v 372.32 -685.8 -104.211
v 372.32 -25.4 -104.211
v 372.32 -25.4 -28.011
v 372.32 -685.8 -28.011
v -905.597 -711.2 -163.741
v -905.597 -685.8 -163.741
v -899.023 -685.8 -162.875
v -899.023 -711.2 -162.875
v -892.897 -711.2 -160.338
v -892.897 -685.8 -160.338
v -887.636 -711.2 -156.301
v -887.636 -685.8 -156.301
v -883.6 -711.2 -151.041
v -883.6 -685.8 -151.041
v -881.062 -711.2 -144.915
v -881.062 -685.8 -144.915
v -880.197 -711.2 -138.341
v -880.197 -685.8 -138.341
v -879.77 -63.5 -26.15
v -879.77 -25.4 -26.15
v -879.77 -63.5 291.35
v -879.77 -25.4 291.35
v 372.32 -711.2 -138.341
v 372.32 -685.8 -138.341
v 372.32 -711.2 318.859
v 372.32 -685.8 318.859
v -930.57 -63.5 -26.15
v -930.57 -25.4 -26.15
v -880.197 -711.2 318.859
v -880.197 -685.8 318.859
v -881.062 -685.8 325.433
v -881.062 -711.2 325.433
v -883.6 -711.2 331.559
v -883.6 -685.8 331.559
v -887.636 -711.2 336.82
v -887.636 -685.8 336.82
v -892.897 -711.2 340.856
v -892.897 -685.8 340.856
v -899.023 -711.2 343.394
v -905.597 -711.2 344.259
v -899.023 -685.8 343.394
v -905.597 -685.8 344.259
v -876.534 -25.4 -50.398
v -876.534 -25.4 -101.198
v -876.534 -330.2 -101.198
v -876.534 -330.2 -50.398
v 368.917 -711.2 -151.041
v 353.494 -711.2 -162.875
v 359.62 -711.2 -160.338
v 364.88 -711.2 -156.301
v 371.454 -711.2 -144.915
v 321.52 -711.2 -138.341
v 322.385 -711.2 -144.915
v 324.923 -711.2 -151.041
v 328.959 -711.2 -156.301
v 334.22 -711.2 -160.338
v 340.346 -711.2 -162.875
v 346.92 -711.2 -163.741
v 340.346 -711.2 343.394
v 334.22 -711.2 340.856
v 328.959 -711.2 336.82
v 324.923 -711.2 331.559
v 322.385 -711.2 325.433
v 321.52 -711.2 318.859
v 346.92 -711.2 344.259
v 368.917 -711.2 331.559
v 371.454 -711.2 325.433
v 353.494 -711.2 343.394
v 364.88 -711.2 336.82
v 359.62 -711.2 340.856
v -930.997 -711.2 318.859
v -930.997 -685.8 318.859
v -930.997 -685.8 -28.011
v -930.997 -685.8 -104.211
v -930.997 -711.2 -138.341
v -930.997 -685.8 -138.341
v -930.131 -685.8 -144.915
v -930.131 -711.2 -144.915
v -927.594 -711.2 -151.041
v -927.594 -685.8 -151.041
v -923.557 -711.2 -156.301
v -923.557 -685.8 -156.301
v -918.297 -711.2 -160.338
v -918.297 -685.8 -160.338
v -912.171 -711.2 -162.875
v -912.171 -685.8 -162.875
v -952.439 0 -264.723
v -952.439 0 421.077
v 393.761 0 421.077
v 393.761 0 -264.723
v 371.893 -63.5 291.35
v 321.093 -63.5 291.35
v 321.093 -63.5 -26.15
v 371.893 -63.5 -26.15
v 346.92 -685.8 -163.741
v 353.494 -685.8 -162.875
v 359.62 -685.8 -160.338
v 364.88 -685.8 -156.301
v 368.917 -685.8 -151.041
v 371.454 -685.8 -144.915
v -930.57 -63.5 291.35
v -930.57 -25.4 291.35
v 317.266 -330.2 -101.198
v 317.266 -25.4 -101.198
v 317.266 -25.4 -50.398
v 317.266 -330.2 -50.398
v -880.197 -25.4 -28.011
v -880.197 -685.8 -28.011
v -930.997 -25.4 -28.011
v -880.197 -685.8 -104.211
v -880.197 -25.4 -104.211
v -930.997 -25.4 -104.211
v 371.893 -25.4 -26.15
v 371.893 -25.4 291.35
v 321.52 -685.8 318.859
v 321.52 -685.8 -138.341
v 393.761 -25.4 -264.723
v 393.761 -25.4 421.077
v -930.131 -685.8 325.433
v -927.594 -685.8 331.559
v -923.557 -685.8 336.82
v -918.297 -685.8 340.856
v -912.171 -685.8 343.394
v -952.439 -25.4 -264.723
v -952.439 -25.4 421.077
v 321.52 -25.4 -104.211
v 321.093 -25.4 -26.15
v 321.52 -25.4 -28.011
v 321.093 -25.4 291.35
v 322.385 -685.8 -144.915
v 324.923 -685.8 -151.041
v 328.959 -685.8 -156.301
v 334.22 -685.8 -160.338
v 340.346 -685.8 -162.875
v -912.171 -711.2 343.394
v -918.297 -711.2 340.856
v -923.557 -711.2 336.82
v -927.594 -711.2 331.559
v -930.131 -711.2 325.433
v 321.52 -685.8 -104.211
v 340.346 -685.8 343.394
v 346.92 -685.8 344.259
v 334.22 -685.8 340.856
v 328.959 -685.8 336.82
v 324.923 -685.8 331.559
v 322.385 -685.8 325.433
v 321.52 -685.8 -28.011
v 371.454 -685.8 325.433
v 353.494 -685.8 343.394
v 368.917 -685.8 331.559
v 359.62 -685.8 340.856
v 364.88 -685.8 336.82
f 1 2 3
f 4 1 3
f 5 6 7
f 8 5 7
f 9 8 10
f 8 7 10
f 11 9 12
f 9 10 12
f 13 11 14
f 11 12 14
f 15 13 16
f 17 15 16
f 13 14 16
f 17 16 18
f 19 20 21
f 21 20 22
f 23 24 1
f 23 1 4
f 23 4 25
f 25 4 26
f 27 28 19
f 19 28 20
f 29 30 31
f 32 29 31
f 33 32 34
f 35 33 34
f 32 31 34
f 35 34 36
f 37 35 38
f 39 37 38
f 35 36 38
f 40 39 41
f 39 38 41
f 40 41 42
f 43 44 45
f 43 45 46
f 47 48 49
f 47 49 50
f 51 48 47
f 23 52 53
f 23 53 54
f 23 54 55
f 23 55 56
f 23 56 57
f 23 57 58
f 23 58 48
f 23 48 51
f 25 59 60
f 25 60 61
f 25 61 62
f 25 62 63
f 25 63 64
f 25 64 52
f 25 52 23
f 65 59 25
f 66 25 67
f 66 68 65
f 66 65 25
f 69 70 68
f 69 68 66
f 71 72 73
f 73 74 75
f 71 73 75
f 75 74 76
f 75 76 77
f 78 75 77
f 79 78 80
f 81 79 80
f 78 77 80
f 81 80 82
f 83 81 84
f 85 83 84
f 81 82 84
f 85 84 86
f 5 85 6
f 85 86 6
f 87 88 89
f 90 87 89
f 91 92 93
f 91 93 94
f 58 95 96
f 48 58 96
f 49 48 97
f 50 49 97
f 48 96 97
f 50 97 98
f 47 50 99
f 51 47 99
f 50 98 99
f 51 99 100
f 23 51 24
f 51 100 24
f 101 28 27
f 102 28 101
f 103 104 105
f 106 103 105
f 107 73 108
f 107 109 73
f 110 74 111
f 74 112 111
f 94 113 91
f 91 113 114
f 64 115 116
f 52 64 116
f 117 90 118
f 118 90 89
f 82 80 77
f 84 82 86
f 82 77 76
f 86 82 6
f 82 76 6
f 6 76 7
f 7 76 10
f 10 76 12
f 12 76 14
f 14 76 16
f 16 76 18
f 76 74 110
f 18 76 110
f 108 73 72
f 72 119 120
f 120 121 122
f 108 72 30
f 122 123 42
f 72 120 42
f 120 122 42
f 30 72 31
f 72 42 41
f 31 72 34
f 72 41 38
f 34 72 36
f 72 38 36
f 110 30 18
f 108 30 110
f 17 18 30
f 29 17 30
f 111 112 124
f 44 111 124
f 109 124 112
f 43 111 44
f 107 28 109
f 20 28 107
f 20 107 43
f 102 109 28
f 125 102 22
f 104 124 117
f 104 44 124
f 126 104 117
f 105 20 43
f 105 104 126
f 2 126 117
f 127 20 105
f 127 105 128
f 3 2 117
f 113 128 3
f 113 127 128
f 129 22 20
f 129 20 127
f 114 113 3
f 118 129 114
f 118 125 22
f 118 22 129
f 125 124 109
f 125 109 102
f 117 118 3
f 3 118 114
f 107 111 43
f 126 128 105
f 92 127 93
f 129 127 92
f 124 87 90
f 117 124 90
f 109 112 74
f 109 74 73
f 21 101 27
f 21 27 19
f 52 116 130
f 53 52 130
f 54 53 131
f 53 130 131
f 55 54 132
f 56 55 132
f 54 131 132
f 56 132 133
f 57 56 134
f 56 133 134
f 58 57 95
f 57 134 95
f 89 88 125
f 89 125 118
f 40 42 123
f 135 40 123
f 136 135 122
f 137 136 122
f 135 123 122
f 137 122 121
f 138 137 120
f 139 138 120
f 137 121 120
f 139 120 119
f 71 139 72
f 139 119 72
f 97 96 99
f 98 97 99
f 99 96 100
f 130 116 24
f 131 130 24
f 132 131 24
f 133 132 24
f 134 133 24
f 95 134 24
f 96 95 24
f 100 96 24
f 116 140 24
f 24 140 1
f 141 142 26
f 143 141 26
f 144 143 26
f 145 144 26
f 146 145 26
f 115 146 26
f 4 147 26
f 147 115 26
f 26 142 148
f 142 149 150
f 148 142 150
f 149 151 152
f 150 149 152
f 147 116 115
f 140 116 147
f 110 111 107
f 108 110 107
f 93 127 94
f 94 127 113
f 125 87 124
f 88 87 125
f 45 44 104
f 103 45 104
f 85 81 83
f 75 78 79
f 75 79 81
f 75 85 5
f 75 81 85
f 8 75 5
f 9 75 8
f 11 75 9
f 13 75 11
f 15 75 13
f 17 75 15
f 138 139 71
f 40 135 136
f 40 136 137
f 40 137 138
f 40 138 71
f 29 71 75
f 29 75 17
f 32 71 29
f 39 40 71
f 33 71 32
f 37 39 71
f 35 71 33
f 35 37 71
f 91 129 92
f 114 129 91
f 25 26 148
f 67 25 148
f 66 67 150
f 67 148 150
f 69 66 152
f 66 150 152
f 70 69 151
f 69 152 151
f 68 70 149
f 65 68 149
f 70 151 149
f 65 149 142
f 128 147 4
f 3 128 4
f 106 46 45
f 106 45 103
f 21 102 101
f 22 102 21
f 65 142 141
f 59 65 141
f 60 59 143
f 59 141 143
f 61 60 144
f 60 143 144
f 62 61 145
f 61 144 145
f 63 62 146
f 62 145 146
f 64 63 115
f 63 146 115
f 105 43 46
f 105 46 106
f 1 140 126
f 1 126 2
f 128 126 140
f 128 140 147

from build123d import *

# Parameters (mm, degrees)
F0_W     = 1346.2
F0_H     = 685.8
F1_DEPTH = 25.4
F2_W     = 50.8
F2_H     = 317.5
F3_DEPTH = 38.1
F4_W     = 50.8
F4_H     = 76.2
F5_DEPTH = 660.4
F7_DEPTH = 25.4
F8_W     = 1193.8
F8_H     = 50.8
F9_DEPTH = 304.8


with BuildPart() as f1:
    # F0 (on Front) → F1 (new body)
    with BuildSketch(Plane.XZ):
        with Locations((-279.338504, 78.177206)):
            Rectangle(F0_W, F0_H)
    extrude(amount=F1_DEPTH)

    # F2 (on face) → F3 (join)
    with BuildSketch(Plane.XZ.offset(25.4)):
        with Locations((-905.169547, 132.599801)):
            Rectangle(F2_W, F2_H)
        with Locations((346.49254, 132.599801)):
            Rectangle(F2_W, F2_H)
    extrude(amount=F3_DEPTH)

    # F4 (on face) → F5 (join)
    with BuildSketch(Plane.XZ.offset(25.4)):
        with Locations((-905.597014, -66.111187)):
            Rectangle(F4_W, F4_H)
        with Locations((346.920007, -66.111187)):
            Rectangle(F4_W, F4_H)
    extrude(amount=F5_DEPTH)

    # F6 (on face) → F7 (join)
    with BuildSketch(Plane.XZ.offset(685.8)):
        with BuildLine():
            Line((-880.196954, -138.340718), (-880.196954, 318.859282))
            ThreePointArc((-880.196954, 318.859282), (-887.636442, 336.819794), (-905.596954, 344.259282))
            ThreePointArc((-905.596954, 344.259282), (-923.557467, 336.819794), (-930.996954, 318.859282))
            Line((-930.996954, 318.859282), (-930.996954, -138.340718))
            ThreePointArc((-930.996954, -138.340718), (-923.557467, -156.30123), (-905.596954, -163.740718))
            ThreePointArc((-905.596954, -163.740718), (-887.636442, -156.30123), (-880.196954, -138.340718))
        make_face()
        with BuildLine():
            ThreePointArc((346.919947, 344.259282), (328.959435, 336.819794), (321.519947, 318.859282))
            Line((321.519947, 318.859282), (321.519947, -138.340718))
            ThreePointArc((321.519947, -138.340718), (328.959435, -156.30123), (346.919947, -163.740718))
            ThreePointArc((346.919947, -163.740718), (364.88046, -156.30123), (372.319947, -138.340718))
            Line((372.319947, -138.340718), (372.319947, 318.859282))
            ThreePointArc((372.319947, 318.859282), (364.88046, 336.819794), (346.919947, 344.259282))
        make_face()
    extrude(amount=F7_DEPTH)

    # F8 (on face) → F9 (join)
    with BuildSketch(Plane.XZ.offset(25.4)):
        with Locations((-279.633806, -75.797988)):
            Rectangle(F8_W, F8_H)
    extrude(amount=F9_DEPTH)


solid = f1.part
